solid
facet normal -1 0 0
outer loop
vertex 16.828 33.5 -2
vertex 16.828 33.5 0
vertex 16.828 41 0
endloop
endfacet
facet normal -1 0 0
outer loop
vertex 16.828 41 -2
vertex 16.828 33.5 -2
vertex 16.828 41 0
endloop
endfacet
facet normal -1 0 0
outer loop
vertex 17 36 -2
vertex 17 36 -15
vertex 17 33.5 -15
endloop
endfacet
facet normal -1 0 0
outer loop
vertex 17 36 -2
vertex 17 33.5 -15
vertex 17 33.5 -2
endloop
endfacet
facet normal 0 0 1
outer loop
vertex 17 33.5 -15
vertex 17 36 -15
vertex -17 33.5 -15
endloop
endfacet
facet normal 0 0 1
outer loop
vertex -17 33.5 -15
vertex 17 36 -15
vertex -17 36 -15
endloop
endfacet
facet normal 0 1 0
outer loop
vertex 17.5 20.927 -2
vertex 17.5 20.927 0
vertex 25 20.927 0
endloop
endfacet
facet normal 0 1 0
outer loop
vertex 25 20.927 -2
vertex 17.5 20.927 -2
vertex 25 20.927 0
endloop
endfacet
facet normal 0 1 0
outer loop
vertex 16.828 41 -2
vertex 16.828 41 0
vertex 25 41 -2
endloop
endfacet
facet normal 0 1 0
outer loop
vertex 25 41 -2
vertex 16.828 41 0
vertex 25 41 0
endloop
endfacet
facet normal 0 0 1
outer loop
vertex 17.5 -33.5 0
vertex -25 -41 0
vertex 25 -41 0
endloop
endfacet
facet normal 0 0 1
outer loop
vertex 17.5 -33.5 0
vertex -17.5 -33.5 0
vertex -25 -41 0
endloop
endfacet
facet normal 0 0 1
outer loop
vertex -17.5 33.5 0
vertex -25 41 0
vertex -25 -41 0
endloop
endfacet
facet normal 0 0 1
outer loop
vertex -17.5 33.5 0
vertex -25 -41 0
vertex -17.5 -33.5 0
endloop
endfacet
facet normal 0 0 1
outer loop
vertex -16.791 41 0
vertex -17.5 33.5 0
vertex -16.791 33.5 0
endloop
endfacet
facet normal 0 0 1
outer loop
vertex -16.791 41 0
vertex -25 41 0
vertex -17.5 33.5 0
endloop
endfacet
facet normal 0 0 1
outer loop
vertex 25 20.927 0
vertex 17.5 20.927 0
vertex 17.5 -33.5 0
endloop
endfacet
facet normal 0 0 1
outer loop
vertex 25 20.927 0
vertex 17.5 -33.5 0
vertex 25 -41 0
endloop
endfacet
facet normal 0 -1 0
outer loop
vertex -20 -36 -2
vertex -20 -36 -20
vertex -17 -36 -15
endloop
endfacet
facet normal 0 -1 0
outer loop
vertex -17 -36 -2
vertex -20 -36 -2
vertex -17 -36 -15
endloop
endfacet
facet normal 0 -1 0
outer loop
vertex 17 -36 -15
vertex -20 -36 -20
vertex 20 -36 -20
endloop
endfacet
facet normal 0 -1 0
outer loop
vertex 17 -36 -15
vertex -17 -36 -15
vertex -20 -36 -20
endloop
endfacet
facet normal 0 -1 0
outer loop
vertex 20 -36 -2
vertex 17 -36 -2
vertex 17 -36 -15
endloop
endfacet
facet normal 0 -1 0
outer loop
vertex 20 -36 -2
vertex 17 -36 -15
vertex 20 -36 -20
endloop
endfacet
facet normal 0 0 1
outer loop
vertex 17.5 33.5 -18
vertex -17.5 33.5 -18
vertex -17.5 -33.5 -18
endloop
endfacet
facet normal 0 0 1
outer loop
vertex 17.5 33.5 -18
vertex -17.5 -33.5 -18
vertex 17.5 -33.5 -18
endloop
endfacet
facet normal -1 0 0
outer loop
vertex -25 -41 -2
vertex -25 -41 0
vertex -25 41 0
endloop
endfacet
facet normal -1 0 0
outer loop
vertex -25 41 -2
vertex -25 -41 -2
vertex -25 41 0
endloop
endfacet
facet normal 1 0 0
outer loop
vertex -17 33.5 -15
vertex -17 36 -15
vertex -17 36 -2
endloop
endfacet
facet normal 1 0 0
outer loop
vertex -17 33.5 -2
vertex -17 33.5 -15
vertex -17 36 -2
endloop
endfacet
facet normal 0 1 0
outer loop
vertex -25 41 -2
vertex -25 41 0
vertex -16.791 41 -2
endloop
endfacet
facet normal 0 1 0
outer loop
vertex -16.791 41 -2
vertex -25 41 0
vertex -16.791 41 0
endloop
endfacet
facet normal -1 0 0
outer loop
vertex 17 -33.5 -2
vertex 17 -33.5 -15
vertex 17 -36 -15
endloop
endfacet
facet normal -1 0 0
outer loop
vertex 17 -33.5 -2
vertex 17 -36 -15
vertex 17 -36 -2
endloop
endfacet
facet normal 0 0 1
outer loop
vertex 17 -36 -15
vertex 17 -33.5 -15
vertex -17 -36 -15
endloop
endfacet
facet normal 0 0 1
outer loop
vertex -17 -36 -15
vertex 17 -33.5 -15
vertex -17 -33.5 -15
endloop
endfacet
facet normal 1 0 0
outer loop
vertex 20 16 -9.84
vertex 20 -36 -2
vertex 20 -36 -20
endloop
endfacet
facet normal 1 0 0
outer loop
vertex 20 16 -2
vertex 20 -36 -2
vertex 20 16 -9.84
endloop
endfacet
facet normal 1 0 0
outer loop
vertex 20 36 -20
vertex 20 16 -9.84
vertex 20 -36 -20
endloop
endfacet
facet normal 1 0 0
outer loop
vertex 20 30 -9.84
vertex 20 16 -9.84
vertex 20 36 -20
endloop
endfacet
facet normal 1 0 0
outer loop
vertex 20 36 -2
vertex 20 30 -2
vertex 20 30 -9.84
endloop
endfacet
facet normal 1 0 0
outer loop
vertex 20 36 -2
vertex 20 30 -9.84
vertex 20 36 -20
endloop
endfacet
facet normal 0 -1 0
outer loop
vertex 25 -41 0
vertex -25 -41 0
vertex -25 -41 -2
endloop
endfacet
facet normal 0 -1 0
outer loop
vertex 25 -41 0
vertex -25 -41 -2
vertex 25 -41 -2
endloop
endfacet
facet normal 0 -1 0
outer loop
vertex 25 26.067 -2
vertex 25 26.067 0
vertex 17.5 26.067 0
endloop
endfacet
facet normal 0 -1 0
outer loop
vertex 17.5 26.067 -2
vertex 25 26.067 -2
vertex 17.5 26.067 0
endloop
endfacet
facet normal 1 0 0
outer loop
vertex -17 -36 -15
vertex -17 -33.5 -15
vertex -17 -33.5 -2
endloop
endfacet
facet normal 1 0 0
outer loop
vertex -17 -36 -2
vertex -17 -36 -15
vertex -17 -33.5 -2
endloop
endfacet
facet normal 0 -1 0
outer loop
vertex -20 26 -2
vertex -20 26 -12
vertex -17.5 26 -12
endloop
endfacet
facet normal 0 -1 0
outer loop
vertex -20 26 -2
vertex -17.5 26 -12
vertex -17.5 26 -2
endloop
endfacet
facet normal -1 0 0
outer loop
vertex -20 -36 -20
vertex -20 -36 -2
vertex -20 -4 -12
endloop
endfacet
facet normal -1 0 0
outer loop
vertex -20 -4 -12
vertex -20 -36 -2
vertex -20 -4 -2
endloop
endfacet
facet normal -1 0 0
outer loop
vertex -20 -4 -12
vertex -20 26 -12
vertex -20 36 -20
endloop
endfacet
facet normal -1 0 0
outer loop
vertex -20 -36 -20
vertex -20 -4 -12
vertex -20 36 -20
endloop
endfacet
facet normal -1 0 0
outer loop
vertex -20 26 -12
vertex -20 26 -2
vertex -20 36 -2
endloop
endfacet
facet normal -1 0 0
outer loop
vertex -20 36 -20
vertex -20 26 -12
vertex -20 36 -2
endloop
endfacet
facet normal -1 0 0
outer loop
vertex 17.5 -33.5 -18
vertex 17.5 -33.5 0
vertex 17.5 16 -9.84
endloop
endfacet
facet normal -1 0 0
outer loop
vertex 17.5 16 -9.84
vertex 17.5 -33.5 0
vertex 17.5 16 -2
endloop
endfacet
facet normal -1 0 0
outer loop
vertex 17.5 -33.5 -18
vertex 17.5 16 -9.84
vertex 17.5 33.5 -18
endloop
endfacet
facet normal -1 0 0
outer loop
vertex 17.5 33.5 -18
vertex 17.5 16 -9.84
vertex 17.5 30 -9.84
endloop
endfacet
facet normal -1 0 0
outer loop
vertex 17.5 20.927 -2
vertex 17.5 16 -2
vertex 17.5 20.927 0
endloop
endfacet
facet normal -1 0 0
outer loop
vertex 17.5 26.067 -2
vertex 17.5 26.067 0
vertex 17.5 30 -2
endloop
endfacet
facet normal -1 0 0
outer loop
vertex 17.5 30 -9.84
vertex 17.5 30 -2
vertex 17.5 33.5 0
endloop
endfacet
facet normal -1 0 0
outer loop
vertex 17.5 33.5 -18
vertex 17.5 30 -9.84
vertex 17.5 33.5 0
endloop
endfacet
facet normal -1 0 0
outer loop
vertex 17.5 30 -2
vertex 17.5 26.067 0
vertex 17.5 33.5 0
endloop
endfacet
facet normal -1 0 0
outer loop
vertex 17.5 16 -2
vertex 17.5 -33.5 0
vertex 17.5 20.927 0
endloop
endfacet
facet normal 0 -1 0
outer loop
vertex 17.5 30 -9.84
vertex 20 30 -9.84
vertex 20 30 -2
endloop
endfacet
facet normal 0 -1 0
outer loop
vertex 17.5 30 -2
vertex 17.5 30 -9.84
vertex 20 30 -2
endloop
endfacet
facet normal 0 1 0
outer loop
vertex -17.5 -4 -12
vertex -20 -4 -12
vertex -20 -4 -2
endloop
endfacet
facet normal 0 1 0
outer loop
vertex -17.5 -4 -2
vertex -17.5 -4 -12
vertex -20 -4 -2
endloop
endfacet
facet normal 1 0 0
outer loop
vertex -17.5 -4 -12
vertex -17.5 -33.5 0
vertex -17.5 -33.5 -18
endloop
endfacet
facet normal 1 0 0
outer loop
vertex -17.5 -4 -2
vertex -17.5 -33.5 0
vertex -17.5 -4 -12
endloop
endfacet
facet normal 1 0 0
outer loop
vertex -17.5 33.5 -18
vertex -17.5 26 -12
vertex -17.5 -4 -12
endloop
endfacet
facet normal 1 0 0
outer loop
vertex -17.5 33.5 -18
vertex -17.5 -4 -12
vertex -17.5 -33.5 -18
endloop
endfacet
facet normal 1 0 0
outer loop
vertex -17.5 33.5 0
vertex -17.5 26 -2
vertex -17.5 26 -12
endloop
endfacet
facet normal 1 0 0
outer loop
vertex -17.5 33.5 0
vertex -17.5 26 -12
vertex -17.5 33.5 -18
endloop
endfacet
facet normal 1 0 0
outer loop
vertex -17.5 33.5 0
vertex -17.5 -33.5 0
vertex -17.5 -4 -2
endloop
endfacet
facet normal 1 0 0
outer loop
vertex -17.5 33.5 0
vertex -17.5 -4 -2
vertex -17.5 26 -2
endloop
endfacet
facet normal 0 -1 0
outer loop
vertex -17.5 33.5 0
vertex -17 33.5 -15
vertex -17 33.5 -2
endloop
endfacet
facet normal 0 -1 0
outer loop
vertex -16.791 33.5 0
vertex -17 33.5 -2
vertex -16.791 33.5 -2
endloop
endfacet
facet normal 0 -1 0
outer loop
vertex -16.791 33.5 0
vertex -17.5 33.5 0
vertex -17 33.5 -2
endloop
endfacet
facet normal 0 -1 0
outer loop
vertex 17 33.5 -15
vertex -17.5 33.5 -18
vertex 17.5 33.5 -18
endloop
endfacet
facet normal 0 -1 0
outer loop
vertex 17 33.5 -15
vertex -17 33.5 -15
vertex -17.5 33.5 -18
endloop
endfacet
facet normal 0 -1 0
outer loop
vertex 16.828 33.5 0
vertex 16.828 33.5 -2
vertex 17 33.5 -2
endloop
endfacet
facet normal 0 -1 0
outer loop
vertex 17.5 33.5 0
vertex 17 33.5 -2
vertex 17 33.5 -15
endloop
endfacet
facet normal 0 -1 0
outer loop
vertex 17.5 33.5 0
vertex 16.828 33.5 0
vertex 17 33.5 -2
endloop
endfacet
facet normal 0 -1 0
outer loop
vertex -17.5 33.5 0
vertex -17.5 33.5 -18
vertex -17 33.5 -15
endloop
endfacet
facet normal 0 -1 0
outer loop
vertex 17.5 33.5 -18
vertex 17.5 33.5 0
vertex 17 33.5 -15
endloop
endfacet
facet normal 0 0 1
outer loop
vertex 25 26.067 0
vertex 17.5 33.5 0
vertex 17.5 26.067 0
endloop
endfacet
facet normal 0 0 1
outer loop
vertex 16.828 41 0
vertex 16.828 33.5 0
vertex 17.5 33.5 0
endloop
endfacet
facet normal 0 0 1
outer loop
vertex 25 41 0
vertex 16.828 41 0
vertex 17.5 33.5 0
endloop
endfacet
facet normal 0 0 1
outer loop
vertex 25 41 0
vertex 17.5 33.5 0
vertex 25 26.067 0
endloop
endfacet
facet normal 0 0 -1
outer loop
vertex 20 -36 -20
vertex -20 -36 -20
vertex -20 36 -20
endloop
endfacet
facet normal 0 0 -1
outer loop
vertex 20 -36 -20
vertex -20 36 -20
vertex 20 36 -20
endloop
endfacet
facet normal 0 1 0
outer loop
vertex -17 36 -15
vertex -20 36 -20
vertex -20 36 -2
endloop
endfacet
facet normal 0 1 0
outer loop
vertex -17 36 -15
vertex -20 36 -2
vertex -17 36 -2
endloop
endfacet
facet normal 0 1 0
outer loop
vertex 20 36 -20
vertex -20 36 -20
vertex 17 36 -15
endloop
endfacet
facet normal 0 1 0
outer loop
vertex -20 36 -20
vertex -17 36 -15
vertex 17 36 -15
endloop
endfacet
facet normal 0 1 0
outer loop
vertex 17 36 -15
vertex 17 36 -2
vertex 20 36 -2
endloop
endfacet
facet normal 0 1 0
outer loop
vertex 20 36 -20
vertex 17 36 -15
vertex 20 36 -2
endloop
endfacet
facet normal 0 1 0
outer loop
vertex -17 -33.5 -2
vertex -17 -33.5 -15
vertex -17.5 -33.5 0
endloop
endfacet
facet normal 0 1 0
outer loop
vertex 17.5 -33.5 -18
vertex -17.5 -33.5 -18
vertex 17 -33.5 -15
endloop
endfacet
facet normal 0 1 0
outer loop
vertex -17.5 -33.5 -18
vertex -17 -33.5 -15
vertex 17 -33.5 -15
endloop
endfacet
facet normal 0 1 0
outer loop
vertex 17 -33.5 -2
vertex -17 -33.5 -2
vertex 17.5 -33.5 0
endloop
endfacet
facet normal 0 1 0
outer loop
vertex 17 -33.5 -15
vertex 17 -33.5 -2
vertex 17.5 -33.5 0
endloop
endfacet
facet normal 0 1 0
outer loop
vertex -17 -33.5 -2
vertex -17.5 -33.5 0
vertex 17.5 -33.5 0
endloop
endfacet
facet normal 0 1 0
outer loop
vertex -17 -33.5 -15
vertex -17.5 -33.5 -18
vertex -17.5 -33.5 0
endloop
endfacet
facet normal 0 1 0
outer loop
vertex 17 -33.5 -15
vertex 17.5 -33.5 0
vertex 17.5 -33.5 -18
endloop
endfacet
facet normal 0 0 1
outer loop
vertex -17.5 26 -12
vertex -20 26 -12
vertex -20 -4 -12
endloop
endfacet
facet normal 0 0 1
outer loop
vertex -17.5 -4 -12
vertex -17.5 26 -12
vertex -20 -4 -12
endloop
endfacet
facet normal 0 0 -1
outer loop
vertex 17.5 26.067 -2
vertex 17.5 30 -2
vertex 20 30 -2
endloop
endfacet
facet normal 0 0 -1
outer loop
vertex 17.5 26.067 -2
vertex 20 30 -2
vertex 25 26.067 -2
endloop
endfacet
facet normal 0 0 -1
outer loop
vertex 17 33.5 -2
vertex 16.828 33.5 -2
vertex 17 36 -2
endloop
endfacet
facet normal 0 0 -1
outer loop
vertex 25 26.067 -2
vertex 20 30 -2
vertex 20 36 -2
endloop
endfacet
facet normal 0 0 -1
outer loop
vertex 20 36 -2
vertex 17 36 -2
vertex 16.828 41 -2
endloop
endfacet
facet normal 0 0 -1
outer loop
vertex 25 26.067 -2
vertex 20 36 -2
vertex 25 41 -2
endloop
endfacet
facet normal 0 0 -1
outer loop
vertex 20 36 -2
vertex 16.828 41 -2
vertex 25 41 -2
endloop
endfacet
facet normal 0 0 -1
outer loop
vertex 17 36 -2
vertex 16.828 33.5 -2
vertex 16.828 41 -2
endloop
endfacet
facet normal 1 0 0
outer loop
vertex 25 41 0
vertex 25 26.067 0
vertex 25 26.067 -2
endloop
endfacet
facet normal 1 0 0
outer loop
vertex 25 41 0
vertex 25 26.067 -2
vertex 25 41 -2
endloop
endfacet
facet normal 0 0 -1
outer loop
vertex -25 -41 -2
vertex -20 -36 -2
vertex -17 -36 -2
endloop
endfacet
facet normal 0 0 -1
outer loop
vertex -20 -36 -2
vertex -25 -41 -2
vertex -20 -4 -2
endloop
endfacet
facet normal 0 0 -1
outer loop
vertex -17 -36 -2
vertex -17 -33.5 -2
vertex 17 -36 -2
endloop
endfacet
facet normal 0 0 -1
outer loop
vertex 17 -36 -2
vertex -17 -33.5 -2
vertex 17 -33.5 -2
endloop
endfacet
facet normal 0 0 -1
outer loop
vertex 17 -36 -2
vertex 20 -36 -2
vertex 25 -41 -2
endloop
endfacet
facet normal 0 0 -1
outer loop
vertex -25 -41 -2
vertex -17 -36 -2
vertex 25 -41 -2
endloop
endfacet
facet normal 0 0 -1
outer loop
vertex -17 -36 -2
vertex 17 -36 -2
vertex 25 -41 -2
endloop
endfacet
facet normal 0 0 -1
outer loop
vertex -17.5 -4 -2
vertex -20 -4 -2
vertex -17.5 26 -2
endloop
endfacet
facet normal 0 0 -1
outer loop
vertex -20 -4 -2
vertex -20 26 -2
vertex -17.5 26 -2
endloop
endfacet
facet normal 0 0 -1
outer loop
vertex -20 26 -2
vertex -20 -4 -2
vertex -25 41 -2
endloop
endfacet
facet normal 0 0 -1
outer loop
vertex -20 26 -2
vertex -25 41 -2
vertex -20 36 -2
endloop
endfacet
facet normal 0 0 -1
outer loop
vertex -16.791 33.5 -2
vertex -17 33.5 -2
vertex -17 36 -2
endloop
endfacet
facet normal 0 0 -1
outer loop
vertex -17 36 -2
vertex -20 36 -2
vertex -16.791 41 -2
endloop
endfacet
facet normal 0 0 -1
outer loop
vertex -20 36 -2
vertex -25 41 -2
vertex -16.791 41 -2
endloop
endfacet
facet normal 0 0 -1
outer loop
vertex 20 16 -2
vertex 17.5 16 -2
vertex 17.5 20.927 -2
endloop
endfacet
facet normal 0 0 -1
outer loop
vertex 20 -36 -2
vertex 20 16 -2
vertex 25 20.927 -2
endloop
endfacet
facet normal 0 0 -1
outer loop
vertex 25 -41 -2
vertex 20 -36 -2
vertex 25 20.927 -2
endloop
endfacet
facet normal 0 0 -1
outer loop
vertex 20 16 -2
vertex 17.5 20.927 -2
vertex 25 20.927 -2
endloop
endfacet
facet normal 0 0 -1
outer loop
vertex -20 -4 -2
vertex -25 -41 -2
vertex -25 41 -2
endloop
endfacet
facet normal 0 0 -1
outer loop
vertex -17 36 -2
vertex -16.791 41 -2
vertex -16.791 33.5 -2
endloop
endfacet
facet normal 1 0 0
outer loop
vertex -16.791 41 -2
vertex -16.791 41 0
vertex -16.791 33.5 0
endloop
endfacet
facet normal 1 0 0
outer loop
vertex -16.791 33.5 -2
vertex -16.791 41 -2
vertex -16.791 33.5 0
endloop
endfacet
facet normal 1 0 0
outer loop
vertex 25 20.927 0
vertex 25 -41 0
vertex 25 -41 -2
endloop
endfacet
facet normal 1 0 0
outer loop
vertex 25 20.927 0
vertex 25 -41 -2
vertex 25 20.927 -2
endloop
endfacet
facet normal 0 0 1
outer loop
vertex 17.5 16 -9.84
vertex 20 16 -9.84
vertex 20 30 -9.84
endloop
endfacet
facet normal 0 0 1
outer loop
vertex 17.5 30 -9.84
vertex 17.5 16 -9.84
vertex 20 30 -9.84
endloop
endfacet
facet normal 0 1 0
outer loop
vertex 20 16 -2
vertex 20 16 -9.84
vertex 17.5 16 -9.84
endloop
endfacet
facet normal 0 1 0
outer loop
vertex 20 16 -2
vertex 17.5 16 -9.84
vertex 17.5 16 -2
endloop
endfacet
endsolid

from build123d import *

# Parameters (mm, degrees)
F0_W      = 40
F0_H      = 72
F0_W_2    = 35
F0_H_2    = 67
F1_DEPTH  = 20
F0_W_3    = 50
F0_H_3    = 82
F2_DEPTH  = 2
F3_DEPTH  = 18
F4_W      = 14
F4_H      = 7.8402353459
F5_DEPTH  = 5
F6_W      = 30
F6_H      = 10
F7_DEPTH  = 5
F8_W      = 34
F8_H      = 13
F9_DEPTH  = 126.25
F10_W     = 5
F10_H     = 5.1396135241
F10_W_2   = 33.6195547134
F10_H_2   = 5
F10_H_3   = 4.6385318637
F10_W_3   = 6.1518945545
F11_DEPTH = 5


with BuildPart() as f1:
    # F0 (on Top) → F1 (new body)
    with BuildSketch(Plane.XY):
        Rectangle(F0_W, F0_H)
        Rectangle(F0_W_2, F0_H_2, mode=Mode.SUBTRACT)
        Rectangle(F0_W_2, F0_H_2)
    extrude(amount=-F1_DEPTH)

    # F0 (on Top) → F2 (join)
    with BuildSketch(Plane.XY):
        Rectangle(F0_W_3, F0_H_3)
        Rectangle(F0_W, F0_H, mode=Mode.SUBTRACT)
    extrude(amount=-F2_DEPTH)

    # F0 (on Top) → F3 (cut)
    with BuildSketch(Plane.XY):
        Rectangle(F0_W_2, F0_H_2)
    extrude(amount=-F3_DEPTH, mode=Mode.SUBTRACT)

    # F4 (on face) → F5 (cut)
    with BuildSketch(Plane.YZ.offset(20)):
        with Locations((23, -5.920117673)):
            Rectangle(F4_W, F4_H)
    extrude(amount=-F5_DEPTH, mode=Mode.SUBTRACT)

    # F6 (on face) → F7 (cut)
    with BuildSketch(Plane(origin=(-20, 0, 0), x_dir=(0, -1, 0), z_dir=(-1, 0, 0))):
        with Locations((-11, -7)):
            Rectangle(F6_W, F6_H)
    extrude(amount=-F7_DEPTH, mode=Mode.SUBTRACT)

    # F8 (on face) → F9 (cut)
    with BuildSketch(Plane(origin=(0, 36, 0), x_dir=(-1, 0, 0), z_dir=(0, 1, 0))):
        with Locations((0, -8.5)):
            Rectangle(F8_W, F8_H)
    extrude(amount=-F9_DEPTH, mode=Mode.SUBTRACT)

    # F10 (on face) → F11 (cut)
    with BuildSketch(Plane.XY):
        with Locations((22.5, 23.4971074387)):
            Rectangle(F10_W, F10_H)
        with Locations((0.0185417011, 38.5)):
            Rectangle(F10_W_2, F10_H_2)
        with Locations((0.0185417011, 33.6807340682)):
            Rectangle(F10_W_2, F10_H_3)
        with Locations((16.9240527228, 23.4971074387)):
            Rectangle(F10_W_3, F10_H)
    extrude(amount=-F11_DEPTH, mode=Mode.SUBTRACT)


solid = f1.part
